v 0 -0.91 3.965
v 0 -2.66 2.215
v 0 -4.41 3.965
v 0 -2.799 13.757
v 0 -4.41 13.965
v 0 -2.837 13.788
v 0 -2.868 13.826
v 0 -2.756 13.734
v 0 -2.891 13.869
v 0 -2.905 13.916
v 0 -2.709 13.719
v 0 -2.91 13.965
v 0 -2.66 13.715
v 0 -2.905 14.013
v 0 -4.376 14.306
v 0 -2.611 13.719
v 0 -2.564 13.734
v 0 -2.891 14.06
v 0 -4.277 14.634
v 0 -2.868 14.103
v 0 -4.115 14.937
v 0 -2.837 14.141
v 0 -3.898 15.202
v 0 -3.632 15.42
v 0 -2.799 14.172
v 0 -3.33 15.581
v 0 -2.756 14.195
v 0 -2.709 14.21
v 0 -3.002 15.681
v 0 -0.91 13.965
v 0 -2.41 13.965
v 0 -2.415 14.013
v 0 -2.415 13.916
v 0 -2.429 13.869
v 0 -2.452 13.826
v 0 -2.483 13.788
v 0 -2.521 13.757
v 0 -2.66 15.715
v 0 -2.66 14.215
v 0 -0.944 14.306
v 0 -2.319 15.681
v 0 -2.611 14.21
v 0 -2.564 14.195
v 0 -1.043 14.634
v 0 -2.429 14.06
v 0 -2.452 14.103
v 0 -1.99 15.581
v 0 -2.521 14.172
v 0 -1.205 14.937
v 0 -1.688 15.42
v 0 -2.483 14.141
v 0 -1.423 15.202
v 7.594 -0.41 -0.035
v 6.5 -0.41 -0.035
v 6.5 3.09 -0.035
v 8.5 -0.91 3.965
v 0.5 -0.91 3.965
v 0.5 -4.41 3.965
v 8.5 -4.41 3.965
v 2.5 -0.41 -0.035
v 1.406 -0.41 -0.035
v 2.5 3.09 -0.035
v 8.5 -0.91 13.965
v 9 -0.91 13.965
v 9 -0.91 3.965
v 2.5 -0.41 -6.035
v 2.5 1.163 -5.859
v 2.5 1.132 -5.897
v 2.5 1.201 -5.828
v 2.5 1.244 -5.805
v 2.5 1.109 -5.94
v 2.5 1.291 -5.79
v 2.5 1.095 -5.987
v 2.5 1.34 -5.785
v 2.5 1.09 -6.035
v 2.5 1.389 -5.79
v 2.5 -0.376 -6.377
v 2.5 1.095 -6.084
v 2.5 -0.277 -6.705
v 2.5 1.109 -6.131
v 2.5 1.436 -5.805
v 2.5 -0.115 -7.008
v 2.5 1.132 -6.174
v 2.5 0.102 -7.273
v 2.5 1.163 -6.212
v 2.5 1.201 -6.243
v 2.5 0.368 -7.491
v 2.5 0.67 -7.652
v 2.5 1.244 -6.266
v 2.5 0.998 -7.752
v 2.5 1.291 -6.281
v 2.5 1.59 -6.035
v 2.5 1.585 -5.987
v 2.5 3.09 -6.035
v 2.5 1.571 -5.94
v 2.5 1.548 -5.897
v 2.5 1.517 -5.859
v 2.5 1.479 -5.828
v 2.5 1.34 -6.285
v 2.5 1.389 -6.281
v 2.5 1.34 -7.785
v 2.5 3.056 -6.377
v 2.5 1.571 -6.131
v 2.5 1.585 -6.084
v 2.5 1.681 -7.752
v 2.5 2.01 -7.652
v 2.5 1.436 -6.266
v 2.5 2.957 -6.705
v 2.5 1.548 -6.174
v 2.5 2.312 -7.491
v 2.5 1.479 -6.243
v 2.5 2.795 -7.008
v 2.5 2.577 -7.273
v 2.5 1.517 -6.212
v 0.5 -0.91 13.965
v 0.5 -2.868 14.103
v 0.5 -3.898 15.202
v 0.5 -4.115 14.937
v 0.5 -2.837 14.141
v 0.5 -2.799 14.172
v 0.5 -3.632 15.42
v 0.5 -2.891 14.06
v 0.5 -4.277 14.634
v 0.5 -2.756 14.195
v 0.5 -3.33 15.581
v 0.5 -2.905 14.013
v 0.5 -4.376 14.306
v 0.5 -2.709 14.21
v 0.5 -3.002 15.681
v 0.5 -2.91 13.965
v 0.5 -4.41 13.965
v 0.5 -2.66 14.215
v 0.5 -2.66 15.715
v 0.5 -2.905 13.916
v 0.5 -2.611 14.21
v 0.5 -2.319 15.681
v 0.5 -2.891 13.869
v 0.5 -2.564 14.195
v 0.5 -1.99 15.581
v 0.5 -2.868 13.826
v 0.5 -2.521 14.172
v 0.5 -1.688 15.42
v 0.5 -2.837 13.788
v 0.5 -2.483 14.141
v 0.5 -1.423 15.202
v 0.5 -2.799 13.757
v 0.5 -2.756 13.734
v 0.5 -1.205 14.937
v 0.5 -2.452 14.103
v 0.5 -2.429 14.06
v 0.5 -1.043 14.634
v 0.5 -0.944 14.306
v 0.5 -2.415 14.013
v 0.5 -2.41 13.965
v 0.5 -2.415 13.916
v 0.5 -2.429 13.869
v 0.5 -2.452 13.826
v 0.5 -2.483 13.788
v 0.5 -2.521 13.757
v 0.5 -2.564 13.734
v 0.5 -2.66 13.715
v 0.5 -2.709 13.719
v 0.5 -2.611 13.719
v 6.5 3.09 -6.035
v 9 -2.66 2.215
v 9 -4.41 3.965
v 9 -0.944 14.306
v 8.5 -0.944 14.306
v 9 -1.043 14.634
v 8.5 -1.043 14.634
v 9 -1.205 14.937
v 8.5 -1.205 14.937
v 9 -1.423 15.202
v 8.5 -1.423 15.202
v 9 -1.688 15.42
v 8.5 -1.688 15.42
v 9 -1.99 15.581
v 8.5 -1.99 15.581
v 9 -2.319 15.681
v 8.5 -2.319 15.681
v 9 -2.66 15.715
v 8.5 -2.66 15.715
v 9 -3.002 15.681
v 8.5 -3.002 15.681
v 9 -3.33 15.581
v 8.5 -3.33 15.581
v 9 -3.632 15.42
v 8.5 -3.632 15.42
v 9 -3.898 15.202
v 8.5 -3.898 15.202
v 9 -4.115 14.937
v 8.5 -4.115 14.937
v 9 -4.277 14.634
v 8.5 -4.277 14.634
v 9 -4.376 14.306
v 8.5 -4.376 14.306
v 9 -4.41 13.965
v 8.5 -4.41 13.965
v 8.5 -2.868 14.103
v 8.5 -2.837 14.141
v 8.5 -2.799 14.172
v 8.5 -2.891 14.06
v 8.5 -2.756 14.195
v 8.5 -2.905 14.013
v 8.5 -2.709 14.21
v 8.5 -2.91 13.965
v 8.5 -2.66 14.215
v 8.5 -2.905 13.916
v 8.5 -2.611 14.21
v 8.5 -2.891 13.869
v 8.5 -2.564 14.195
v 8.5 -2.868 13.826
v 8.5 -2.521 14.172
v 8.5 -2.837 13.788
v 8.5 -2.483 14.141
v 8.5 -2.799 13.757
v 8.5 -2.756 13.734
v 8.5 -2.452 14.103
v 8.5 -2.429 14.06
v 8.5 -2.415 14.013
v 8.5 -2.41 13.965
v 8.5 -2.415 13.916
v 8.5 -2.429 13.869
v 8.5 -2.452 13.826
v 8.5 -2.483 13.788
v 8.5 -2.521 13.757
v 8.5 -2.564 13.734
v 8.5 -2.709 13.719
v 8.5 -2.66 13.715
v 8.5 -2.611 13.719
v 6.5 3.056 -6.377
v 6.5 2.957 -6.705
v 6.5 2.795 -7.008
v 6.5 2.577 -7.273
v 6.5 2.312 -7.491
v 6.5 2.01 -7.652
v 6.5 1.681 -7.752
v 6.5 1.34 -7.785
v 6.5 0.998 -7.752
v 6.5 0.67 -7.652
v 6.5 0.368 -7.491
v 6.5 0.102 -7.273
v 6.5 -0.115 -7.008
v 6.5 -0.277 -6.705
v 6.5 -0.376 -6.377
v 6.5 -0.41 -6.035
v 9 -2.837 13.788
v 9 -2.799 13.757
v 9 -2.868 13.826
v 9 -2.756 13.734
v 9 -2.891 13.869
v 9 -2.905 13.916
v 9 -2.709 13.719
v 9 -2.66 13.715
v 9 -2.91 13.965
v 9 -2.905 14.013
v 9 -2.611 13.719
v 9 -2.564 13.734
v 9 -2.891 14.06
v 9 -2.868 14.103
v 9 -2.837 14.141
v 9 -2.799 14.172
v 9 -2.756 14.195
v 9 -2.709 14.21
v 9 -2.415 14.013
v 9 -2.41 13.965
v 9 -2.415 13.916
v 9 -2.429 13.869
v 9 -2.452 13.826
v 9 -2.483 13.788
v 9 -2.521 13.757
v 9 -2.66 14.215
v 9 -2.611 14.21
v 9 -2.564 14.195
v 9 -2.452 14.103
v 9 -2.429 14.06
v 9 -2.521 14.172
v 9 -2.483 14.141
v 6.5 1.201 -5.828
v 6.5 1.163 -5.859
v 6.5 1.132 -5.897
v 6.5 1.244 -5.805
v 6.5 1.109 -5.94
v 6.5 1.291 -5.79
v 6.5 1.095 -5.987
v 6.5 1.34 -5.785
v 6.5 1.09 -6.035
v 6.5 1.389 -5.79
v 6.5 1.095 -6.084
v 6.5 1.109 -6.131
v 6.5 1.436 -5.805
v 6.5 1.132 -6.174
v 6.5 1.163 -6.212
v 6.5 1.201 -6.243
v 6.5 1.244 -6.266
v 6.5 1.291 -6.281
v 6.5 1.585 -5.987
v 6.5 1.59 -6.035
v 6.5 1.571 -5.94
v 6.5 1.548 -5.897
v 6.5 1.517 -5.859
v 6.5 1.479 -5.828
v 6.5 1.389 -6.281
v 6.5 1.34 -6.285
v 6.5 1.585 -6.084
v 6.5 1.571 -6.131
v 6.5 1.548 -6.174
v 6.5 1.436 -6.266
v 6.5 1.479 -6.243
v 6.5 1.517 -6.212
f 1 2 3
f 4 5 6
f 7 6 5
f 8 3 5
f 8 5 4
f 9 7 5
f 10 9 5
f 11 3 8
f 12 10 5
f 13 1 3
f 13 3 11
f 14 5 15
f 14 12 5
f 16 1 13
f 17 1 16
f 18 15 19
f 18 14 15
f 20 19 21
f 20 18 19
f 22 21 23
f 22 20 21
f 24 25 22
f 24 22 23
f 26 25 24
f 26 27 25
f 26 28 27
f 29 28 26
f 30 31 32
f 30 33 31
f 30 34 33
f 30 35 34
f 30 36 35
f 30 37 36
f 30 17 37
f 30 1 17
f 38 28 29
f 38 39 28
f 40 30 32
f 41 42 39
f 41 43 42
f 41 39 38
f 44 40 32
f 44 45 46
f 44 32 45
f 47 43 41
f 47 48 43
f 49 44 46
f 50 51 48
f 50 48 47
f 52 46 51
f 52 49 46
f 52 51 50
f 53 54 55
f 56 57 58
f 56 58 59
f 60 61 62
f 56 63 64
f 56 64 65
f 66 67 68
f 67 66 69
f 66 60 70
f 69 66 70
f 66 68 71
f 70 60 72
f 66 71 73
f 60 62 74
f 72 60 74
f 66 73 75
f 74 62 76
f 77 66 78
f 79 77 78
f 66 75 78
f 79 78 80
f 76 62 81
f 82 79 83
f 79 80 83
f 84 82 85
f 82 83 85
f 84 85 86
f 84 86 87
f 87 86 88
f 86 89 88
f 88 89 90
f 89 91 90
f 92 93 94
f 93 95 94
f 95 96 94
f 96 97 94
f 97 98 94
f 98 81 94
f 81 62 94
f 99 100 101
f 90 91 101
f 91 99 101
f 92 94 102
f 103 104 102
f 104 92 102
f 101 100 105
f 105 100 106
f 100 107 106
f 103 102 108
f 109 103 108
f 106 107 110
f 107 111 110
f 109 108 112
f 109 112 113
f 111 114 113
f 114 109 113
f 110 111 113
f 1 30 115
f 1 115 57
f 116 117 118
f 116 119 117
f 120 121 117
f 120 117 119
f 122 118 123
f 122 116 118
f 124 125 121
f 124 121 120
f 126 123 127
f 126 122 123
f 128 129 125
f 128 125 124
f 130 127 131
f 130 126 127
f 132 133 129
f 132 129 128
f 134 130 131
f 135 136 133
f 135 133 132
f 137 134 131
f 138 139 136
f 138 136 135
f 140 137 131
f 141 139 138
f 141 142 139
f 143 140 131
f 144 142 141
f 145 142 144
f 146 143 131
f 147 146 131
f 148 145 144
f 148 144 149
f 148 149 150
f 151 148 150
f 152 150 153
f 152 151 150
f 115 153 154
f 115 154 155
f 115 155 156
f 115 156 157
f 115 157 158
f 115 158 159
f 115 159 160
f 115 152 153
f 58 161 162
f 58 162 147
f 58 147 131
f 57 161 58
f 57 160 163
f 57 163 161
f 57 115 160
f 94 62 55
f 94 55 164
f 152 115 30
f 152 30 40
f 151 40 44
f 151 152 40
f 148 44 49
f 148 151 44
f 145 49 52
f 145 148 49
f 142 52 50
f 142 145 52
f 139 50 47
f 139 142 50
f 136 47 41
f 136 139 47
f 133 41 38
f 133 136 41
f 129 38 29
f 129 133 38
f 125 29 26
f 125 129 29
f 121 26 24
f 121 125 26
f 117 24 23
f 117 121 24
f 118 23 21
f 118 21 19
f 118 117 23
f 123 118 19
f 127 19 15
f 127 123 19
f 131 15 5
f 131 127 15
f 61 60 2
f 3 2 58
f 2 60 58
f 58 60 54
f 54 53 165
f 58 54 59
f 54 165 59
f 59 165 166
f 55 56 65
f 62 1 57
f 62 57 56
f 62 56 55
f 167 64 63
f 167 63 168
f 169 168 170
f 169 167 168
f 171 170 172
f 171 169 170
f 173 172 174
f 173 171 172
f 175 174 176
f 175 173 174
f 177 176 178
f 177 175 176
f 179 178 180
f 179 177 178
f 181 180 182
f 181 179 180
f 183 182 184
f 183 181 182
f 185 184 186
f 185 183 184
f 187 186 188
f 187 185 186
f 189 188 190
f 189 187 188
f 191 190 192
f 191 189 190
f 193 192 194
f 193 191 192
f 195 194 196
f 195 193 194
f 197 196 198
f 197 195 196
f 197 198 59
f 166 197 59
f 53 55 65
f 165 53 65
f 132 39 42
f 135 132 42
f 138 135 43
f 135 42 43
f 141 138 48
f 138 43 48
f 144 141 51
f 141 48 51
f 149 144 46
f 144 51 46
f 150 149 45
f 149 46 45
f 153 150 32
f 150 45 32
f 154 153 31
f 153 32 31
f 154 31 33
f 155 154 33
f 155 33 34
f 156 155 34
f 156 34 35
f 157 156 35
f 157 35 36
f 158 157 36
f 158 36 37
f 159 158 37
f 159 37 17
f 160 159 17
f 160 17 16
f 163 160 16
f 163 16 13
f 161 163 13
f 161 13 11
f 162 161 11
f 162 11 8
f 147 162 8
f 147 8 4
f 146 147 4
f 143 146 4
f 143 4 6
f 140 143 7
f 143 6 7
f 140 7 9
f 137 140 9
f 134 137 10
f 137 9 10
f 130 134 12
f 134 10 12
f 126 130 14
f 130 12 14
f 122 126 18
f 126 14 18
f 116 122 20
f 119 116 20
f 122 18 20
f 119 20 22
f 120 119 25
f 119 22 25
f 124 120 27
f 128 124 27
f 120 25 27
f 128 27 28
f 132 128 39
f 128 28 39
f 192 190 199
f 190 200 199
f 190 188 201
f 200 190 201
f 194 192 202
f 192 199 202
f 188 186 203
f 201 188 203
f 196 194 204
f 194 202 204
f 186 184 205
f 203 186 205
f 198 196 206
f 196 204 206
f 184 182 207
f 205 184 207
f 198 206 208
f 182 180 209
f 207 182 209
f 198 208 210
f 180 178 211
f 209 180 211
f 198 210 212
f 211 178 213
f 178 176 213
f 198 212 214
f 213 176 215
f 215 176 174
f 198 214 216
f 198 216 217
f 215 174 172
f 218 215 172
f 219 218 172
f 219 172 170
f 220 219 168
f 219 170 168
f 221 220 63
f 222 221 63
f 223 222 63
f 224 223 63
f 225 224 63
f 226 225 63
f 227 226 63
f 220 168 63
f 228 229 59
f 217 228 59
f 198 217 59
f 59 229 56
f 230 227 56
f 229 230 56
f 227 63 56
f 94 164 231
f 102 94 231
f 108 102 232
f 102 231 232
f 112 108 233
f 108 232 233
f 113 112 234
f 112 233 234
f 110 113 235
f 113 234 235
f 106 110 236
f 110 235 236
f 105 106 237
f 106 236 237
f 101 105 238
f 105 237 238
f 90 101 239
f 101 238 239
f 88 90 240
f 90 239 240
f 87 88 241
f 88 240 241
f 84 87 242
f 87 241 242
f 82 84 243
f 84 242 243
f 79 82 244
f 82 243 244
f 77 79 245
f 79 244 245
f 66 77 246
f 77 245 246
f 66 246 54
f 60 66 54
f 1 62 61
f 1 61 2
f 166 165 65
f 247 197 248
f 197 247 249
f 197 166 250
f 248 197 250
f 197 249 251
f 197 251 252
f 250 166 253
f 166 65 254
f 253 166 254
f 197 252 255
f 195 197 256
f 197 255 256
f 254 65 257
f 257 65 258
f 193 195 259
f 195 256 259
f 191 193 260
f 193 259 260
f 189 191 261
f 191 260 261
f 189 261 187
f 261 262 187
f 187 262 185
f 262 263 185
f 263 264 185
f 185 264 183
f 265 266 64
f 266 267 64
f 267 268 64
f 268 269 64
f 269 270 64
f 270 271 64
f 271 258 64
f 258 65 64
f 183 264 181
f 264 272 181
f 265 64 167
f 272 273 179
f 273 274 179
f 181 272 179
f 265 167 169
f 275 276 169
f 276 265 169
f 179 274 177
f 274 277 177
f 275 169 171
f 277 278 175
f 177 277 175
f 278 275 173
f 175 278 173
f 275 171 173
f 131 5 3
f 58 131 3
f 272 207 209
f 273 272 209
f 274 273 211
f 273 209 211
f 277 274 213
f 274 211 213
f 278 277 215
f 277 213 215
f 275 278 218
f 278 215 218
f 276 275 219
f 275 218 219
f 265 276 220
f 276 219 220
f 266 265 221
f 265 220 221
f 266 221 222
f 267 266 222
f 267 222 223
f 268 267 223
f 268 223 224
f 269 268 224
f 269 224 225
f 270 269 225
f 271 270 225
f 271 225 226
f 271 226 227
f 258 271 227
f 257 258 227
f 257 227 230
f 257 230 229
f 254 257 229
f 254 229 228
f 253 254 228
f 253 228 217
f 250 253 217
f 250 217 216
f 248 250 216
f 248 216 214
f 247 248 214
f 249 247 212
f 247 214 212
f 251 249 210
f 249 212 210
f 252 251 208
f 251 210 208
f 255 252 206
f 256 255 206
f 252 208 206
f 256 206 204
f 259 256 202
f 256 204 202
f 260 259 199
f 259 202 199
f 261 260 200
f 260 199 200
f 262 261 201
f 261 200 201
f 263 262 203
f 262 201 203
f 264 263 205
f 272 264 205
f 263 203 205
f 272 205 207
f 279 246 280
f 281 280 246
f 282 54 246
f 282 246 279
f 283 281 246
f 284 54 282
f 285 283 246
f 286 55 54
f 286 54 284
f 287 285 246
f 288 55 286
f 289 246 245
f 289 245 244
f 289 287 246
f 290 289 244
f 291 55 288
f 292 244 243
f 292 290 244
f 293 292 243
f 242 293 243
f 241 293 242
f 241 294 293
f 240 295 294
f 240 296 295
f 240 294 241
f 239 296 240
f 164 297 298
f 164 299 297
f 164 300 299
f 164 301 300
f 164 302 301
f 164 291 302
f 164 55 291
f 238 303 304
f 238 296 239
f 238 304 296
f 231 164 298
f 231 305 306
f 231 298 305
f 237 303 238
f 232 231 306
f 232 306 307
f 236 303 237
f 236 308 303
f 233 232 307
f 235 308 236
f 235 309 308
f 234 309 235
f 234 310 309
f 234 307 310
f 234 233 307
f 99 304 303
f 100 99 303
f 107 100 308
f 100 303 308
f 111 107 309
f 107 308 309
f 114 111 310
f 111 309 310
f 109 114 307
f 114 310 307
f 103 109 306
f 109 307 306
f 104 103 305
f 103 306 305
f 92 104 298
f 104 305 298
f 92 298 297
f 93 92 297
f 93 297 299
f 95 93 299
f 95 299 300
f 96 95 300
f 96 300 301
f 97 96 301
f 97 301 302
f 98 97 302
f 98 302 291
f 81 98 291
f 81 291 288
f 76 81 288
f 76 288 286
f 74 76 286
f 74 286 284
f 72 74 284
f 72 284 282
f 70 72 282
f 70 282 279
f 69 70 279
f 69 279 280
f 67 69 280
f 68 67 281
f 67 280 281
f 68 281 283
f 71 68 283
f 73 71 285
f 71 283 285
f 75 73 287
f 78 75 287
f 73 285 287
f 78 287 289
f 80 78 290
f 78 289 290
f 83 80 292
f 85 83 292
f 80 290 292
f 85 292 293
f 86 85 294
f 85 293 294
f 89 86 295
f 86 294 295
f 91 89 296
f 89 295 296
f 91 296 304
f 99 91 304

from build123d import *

# Parameters (mm, degrees)
SKETCH_1_W               = 20
SKETCH_1_H               = 10
EXTRUDE_1_DEPTH          = 9
CUT_EXTRUDE_3_DEPTH      = 9
CUT_EXTRUDE_4_DEPTH      = 18.52868966
CUT_EXTRUDE_4_DEPTH_BACK = 9
EXTRUDE_2_DEPTH          = 9
EXTRUDE_3_DEPTH          = 9
SKETCH_10_W              = 8
SKETCH_10_H              = 13
CUT_EXTRUDE_5_DEPTH      = 9
SKETCH_12_W              = 2.5
SKETCH_12_H              = 12
CUT_EXTRUDE_6_DEPTH      = 9
SKETCH_13_W              = 2.5
SKETCH_13_H              = 7.75
CUT_EXTRUDE_7_DEPTH      = 9
CUT_EXTRUDE_8_DEPTH      = 9
CUT_EXTRUDE_9_DEPTH      = 9
SKETCH_18_R              = 0.25
CUT_EXTRUDE_12_DEPTH     = 18.568302001
SKETCH_26_R              = 0.25
CUT_EXTRUDE_16_DEPTH     = 19.638541659


with BuildPart() as part:
    # 草图1 → 凸台-拉伸1 (new body)
    with BuildSketch(Plane(origin=(0, 0, 0), x_dir=(0, 0, -1), z_dir=(1, 0, 0))):
        with Locations((-3.964524465, 0.58990319)):
            Rectangle(SKETCH_1_W, SKETCH_1_H)
    extrude(amount=EXTRUDE_1_DEPTH)

    # 草图2 → 切除-拉伸3 (cut)
    with BuildSketch(Plane(origin=(9, 0, 0), x_dir=(0, 0, -1), z_dir=(1, 0, 0))):
        Polygon((0.035475535, -0.41009681), (-3.964524465, -4.41009681), (6.035475535, -4.41009681), (6.035475535, -0.410096535), align=None)
    extrude(amount=-CUT_EXTRUDE_3_DEPTH, mode=Mode.SUBTRACT)

    # 草图6 → 切除-拉伸4 (cut, two sides: drawn at the far end of the back side and taken through both)
    with BuildSketch(Plane(origin=(9, 0, 0), x_dir=(0, 0, -1), z_dir=(1, 0, 0)).offset(-CUT_EXTRUDE_4_DEPTH_BACK)):
        Polygon((-66.684543288, -0.910096672), (-13.964524465, -0.910096672), (-3.964524465, -0.910096672), (0.035475535, 3.089903328), (6.035475535, 3.089903328), (58.755494358, 3.089903328), (55.394957379, 108.476374614), (-70.045080267, 104.476374614), align=None)
    extrude(amount=CUT_EXTRUDE_4_DEPTH + CUT_EXTRUDE_4_DEPTH_BACK, mode=Mode.SUBTRACT)

    # 草图8 → 凸台-拉伸2 (add)
    with BuildSketch(Plane(origin=(9, 0, 0), x_dir=(0, 0, -1), z_dir=(1, 0, 0))):
        with BuildLine():
            Line((-13.964524465, -4.41009681), (-13.964524465, -0.910096672))
            ThreePointArc((-13.964524465, -0.910096672), (-15.714524534, -2.660096741), (-13.964524465, -4.41009681))
        make_face()
    extrude(amount=-EXTRUDE_2_DEPTH)

    # 草图9 → 凸台-拉伸3 (add)
    with BuildSketch(Plane(origin=(9, 0, 0), x_dir=(0, 0, -1), z_dir=(1, 0, 0))):
        with BuildLine():
            Line((6.035475535, -0.410096672), (6.035475535, 3.089903328))
            ThreePointArc((6.035475535, 3.089903328), (7.785475535, 1.339903328), (6.035475535, -0.410096672))
        make_face()
    extrude(amount=-EXTRUDE_3_DEPTH)

    # 草图10 → 切除-拉伸5 (cut)
    with BuildSketch(Plane(origin=(0, -0.910096672, 0), x_dir=(1, 0, 0), z_dir=(0, 1, 0))):
        with Locations((4.5, -10.464524465)):
            Rectangle(SKETCH_10_W, SKETCH_10_H)
    extrude(amount=-CUT_EXTRUDE_5_DEPTH, mode=Mode.SUBTRACT)

    # 草图12 → 切除-拉伸6 (cut)
    with BuildSketch(Plane(origin=(0, 3.089903328, 0), x_dir=(1, 0, 0), z_dir=(0, 1, 0))):
        with Locations((7.75, 6.035475535)):
            Rectangle(SKETCH_12_W, SKETCH_12_H)
    extrude(amount=-CUT_EXTRUDE_6_DEPTH, mode=Mode.SUBTRACT)

    # 草图13 → 切除-拉伸7 (cut)
    with BuildSketch(Plane(origin=(0, 3.089903328, 0), x_dir=(1, 0, 0), z_dir=(0, 1, 0))):
        with Locations((1.25, 3.910475535)):
            Rectangle(SKETCH_13_W, SKETCH_13_H)
    extrude(amount=-CUT_EXTRUDE_7_DEPTH, mode=Mode.SUBTRACT)

    # 草图14 → 切除-拉伸8 (cut)
    with BuildSketch(Plane(origin=(0, 1.527213896, 1.527213896), x_dir=(1, 0, 0), z_dir=(0, 0.7071067811865477, 0.7071067811865475))):
        Polygon((2.5, 2.209976588), (0, -3.446877662), (-6.872938914, -0.617067375), (-4.372938914, 5.039786874), align=None)
    extrude(amount=-CUT_EXTRUDE_8_DEPTH, mode=Mode.SUBTRACT)

    # 草图15 → 切除-拉伸9 (cut)
    with BuildSketch(Plane(origin=(0, 1.527213896, 1.527213896), x_dir=(1, 0, 0), z_dir=(0, 0.7071067811865477, 0.7071067811865475))):
        Polygon((6.5, 2.209976588), (9, -3.446877662), (12.673354488, 0), (10.173354488, 5.656854249), align=None)
    extrude(amount=-CUT_EXTRUDE_9_DEPTH, mode=Mode.SUBTRACT)

    # 草图18 → 切除-拉伸12 (cut, through all)
    with BuildSketch(Plane(origin=(6.5, 0, 0), x_dir=(0, 0, -1), z_dir=(1, 0, 0))):
        with Locations((6.035475535, 1.339903328)):
            Circle(SKETCH_18_R)
    extrude(amount=-CUT_EXTRUDE_12_DEPTH, mode=Mode.SUBTRACT)

    # 草图26 → 切除-拉伸16 (cut, through all)
    with BuildSketch(Plane.ZY):
        with Locations((13.964524465, -2.660096741)):
            Circle(SKETCH_26_R)
    extrude(amount=-CUT_EXTRUDE_16_DEPTH, mode=Mode.SUBTRACT)


solid = part.part
